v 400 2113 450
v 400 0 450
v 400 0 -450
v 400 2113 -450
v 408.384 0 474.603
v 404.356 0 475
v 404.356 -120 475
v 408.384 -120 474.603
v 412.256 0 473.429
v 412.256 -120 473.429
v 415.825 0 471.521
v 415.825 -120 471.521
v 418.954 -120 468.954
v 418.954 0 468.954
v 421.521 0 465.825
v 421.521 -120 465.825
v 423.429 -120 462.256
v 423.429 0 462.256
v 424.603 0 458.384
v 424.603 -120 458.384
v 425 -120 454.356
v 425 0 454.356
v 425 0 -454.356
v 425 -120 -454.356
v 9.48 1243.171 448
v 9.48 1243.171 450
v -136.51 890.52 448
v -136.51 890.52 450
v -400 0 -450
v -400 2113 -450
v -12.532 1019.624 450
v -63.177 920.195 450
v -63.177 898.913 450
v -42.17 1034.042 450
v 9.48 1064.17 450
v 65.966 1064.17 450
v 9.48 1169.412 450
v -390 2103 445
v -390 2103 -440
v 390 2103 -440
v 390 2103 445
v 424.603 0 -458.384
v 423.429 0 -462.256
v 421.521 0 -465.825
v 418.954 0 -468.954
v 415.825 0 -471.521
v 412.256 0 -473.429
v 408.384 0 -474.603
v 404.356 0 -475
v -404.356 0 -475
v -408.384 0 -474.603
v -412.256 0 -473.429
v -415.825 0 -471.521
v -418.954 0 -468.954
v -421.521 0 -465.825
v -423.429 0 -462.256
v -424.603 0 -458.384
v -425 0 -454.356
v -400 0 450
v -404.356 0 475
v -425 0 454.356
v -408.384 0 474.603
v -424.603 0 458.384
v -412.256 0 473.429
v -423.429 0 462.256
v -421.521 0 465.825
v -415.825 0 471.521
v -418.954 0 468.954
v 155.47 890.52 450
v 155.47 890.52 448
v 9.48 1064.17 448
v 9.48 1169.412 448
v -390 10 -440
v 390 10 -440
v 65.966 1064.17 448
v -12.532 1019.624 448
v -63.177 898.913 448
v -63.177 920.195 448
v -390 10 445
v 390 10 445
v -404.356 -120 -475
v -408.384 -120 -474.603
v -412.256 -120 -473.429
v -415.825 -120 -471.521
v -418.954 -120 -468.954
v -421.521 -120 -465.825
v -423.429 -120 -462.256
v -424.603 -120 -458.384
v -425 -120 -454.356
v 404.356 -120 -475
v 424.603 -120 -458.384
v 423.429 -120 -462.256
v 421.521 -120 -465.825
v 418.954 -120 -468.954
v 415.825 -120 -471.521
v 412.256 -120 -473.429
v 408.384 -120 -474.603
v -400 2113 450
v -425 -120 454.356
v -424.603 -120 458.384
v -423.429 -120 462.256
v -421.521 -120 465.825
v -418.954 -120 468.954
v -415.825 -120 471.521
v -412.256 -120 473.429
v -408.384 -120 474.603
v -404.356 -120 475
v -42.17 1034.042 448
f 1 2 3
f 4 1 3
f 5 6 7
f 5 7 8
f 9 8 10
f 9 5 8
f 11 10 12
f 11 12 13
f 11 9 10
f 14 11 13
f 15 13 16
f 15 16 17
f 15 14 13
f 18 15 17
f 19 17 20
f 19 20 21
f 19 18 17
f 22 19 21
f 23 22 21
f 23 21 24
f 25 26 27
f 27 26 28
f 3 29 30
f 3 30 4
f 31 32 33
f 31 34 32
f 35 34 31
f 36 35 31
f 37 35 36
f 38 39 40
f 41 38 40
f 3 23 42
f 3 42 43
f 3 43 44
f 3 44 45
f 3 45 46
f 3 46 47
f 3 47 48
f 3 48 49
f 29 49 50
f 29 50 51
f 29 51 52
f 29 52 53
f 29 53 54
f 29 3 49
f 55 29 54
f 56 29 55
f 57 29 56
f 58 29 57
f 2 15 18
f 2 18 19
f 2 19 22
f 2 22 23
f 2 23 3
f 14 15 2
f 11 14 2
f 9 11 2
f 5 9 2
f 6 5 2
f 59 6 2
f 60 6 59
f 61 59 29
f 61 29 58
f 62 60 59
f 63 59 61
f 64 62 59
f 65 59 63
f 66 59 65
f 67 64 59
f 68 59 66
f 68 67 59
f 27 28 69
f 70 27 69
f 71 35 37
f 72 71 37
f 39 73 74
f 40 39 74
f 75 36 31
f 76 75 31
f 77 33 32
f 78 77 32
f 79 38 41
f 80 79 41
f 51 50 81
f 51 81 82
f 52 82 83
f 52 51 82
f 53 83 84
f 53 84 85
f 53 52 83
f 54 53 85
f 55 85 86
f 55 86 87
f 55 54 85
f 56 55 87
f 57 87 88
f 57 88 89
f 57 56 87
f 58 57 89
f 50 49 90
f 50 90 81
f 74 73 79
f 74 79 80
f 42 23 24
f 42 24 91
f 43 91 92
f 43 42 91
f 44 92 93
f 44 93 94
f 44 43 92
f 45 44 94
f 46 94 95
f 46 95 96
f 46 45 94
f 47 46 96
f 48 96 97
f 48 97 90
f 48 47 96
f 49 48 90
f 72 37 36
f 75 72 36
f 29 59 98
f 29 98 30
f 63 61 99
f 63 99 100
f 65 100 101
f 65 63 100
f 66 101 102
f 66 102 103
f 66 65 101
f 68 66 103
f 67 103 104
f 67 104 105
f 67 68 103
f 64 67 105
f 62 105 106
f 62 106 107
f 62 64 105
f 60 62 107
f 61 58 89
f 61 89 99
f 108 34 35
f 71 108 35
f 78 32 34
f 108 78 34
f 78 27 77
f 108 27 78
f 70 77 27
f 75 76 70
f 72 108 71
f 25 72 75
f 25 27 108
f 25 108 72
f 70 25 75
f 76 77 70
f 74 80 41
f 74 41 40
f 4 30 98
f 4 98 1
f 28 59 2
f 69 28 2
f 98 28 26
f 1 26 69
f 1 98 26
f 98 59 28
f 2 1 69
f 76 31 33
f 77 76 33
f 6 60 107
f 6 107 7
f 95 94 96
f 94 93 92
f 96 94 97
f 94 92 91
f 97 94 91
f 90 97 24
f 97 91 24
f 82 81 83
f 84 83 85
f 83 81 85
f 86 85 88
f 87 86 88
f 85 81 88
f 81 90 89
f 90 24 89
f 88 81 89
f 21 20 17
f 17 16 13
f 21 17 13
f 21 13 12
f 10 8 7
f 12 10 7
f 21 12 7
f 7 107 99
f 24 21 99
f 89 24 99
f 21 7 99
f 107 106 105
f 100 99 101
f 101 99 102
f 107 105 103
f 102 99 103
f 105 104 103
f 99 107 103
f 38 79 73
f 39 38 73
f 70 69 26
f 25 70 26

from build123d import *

# Parameters (mm, degrees)
CROQUIS1_W              = 800
CROQUIS1_H              = 900
SALIENTE_EXTRUIR1_DEPTH = 2113
VACIADO2_T              = -10
CROQUIS2_W              = 780
CROQUIS2_H              = 2093
SALIENTE_EXTRUIR2_DEPTH = 5
CORTAR_EXTRUIR1_DEPTH   = 2
SALIENTE_EXTRUIR3_DEPTH = 120


with BuildPart() as part:
    # Croquis1 → Saliente-Extruir1 (new body)
    with BuildSketch(Plane(origin=(0, 0, 0), x_dir=(1, 0, 0), z_dir=(0, 1, 0))):
        Rectangle(CROQUIS1_W, CROQUIS1_H)
    extrude(amount=SALIENTE_EXTRUIR1_DEPTH)

    # Vaciado2
    vaciado2_openings = [part.faces().sort_by_distance(p)[0] for p in [
        (0, 1056.5, 450),
    ]]
    offset(amount=VACIADO2_T, openings=vaciado2_openings, kind=Kind.INTERSECTION)

    # Croquis2 → Saliente-Extruir2 (add)
    with BuildSketch(Plane.XY.offset(450)):
        with Locations((0, 1056.5)):
            Rectangle(CROQUIS2_W, CROQUIS2_H)
    extrude(amount=-SALIENTE_EXTRUIR2_DEPTH)

    # Croquis3 → Cortar-Extruir1 (cut)
    with BuildSketch(Plane.XY.offset(450)):
        Polygon((-136.509991439, 890.520139483), (155.469712472, 890.520139483), (9.479860517, 1243.170950701), align=None)
        Polygon((-63.176808732, 920.19459615), (-42.169545822, 1034.041849102), (9.479860517, 1064.169920858), (9.479860517, 1169.411963853), (65.966344659, 1064.169920858), (-12.532301764, 1019.623730372), (-63.176808732, 898.913148296), align=None, mode=Mode.SUBTRACT)
    extrude(amount=-CORTAR_EXTRUIR1_DEPTH, mode=Mode.SUBTRACT)

    # Croquis4 → Saliente-Extruir3 (add)
    with BuildSketch(Plane.XZ):
        with BuildLine():
            Line((-404.35645152, 475), (404.35645152, 475))
            ThreePointArc((404.35645152, 475), (418.953644638, 468.953644638), (425, 454.35645152))
            Line((425, 454.35645152), (425, -454.35645152))
            ThreePointArc((425, -454.35645152), (418.953644638, -468.953644638), (404.35645152, -475))
            Line((404.35645152, -475), (-404.35645152, -475))
            ThreePointArc((-404.35645152, -475), (-418.953644638, -468.953644638), (-425, -454.35645152))
            Line((-425, -454.35645152), (-425, 454.35645152))
            ThreePointArc((-425, 454.35645152), (-418.953644638, 468.953644638), (-404.35645152, 475))
        make_face()
    extrude(amount=SALIENTE_EXTRUIR3_DEPTH)


solid = part.part
